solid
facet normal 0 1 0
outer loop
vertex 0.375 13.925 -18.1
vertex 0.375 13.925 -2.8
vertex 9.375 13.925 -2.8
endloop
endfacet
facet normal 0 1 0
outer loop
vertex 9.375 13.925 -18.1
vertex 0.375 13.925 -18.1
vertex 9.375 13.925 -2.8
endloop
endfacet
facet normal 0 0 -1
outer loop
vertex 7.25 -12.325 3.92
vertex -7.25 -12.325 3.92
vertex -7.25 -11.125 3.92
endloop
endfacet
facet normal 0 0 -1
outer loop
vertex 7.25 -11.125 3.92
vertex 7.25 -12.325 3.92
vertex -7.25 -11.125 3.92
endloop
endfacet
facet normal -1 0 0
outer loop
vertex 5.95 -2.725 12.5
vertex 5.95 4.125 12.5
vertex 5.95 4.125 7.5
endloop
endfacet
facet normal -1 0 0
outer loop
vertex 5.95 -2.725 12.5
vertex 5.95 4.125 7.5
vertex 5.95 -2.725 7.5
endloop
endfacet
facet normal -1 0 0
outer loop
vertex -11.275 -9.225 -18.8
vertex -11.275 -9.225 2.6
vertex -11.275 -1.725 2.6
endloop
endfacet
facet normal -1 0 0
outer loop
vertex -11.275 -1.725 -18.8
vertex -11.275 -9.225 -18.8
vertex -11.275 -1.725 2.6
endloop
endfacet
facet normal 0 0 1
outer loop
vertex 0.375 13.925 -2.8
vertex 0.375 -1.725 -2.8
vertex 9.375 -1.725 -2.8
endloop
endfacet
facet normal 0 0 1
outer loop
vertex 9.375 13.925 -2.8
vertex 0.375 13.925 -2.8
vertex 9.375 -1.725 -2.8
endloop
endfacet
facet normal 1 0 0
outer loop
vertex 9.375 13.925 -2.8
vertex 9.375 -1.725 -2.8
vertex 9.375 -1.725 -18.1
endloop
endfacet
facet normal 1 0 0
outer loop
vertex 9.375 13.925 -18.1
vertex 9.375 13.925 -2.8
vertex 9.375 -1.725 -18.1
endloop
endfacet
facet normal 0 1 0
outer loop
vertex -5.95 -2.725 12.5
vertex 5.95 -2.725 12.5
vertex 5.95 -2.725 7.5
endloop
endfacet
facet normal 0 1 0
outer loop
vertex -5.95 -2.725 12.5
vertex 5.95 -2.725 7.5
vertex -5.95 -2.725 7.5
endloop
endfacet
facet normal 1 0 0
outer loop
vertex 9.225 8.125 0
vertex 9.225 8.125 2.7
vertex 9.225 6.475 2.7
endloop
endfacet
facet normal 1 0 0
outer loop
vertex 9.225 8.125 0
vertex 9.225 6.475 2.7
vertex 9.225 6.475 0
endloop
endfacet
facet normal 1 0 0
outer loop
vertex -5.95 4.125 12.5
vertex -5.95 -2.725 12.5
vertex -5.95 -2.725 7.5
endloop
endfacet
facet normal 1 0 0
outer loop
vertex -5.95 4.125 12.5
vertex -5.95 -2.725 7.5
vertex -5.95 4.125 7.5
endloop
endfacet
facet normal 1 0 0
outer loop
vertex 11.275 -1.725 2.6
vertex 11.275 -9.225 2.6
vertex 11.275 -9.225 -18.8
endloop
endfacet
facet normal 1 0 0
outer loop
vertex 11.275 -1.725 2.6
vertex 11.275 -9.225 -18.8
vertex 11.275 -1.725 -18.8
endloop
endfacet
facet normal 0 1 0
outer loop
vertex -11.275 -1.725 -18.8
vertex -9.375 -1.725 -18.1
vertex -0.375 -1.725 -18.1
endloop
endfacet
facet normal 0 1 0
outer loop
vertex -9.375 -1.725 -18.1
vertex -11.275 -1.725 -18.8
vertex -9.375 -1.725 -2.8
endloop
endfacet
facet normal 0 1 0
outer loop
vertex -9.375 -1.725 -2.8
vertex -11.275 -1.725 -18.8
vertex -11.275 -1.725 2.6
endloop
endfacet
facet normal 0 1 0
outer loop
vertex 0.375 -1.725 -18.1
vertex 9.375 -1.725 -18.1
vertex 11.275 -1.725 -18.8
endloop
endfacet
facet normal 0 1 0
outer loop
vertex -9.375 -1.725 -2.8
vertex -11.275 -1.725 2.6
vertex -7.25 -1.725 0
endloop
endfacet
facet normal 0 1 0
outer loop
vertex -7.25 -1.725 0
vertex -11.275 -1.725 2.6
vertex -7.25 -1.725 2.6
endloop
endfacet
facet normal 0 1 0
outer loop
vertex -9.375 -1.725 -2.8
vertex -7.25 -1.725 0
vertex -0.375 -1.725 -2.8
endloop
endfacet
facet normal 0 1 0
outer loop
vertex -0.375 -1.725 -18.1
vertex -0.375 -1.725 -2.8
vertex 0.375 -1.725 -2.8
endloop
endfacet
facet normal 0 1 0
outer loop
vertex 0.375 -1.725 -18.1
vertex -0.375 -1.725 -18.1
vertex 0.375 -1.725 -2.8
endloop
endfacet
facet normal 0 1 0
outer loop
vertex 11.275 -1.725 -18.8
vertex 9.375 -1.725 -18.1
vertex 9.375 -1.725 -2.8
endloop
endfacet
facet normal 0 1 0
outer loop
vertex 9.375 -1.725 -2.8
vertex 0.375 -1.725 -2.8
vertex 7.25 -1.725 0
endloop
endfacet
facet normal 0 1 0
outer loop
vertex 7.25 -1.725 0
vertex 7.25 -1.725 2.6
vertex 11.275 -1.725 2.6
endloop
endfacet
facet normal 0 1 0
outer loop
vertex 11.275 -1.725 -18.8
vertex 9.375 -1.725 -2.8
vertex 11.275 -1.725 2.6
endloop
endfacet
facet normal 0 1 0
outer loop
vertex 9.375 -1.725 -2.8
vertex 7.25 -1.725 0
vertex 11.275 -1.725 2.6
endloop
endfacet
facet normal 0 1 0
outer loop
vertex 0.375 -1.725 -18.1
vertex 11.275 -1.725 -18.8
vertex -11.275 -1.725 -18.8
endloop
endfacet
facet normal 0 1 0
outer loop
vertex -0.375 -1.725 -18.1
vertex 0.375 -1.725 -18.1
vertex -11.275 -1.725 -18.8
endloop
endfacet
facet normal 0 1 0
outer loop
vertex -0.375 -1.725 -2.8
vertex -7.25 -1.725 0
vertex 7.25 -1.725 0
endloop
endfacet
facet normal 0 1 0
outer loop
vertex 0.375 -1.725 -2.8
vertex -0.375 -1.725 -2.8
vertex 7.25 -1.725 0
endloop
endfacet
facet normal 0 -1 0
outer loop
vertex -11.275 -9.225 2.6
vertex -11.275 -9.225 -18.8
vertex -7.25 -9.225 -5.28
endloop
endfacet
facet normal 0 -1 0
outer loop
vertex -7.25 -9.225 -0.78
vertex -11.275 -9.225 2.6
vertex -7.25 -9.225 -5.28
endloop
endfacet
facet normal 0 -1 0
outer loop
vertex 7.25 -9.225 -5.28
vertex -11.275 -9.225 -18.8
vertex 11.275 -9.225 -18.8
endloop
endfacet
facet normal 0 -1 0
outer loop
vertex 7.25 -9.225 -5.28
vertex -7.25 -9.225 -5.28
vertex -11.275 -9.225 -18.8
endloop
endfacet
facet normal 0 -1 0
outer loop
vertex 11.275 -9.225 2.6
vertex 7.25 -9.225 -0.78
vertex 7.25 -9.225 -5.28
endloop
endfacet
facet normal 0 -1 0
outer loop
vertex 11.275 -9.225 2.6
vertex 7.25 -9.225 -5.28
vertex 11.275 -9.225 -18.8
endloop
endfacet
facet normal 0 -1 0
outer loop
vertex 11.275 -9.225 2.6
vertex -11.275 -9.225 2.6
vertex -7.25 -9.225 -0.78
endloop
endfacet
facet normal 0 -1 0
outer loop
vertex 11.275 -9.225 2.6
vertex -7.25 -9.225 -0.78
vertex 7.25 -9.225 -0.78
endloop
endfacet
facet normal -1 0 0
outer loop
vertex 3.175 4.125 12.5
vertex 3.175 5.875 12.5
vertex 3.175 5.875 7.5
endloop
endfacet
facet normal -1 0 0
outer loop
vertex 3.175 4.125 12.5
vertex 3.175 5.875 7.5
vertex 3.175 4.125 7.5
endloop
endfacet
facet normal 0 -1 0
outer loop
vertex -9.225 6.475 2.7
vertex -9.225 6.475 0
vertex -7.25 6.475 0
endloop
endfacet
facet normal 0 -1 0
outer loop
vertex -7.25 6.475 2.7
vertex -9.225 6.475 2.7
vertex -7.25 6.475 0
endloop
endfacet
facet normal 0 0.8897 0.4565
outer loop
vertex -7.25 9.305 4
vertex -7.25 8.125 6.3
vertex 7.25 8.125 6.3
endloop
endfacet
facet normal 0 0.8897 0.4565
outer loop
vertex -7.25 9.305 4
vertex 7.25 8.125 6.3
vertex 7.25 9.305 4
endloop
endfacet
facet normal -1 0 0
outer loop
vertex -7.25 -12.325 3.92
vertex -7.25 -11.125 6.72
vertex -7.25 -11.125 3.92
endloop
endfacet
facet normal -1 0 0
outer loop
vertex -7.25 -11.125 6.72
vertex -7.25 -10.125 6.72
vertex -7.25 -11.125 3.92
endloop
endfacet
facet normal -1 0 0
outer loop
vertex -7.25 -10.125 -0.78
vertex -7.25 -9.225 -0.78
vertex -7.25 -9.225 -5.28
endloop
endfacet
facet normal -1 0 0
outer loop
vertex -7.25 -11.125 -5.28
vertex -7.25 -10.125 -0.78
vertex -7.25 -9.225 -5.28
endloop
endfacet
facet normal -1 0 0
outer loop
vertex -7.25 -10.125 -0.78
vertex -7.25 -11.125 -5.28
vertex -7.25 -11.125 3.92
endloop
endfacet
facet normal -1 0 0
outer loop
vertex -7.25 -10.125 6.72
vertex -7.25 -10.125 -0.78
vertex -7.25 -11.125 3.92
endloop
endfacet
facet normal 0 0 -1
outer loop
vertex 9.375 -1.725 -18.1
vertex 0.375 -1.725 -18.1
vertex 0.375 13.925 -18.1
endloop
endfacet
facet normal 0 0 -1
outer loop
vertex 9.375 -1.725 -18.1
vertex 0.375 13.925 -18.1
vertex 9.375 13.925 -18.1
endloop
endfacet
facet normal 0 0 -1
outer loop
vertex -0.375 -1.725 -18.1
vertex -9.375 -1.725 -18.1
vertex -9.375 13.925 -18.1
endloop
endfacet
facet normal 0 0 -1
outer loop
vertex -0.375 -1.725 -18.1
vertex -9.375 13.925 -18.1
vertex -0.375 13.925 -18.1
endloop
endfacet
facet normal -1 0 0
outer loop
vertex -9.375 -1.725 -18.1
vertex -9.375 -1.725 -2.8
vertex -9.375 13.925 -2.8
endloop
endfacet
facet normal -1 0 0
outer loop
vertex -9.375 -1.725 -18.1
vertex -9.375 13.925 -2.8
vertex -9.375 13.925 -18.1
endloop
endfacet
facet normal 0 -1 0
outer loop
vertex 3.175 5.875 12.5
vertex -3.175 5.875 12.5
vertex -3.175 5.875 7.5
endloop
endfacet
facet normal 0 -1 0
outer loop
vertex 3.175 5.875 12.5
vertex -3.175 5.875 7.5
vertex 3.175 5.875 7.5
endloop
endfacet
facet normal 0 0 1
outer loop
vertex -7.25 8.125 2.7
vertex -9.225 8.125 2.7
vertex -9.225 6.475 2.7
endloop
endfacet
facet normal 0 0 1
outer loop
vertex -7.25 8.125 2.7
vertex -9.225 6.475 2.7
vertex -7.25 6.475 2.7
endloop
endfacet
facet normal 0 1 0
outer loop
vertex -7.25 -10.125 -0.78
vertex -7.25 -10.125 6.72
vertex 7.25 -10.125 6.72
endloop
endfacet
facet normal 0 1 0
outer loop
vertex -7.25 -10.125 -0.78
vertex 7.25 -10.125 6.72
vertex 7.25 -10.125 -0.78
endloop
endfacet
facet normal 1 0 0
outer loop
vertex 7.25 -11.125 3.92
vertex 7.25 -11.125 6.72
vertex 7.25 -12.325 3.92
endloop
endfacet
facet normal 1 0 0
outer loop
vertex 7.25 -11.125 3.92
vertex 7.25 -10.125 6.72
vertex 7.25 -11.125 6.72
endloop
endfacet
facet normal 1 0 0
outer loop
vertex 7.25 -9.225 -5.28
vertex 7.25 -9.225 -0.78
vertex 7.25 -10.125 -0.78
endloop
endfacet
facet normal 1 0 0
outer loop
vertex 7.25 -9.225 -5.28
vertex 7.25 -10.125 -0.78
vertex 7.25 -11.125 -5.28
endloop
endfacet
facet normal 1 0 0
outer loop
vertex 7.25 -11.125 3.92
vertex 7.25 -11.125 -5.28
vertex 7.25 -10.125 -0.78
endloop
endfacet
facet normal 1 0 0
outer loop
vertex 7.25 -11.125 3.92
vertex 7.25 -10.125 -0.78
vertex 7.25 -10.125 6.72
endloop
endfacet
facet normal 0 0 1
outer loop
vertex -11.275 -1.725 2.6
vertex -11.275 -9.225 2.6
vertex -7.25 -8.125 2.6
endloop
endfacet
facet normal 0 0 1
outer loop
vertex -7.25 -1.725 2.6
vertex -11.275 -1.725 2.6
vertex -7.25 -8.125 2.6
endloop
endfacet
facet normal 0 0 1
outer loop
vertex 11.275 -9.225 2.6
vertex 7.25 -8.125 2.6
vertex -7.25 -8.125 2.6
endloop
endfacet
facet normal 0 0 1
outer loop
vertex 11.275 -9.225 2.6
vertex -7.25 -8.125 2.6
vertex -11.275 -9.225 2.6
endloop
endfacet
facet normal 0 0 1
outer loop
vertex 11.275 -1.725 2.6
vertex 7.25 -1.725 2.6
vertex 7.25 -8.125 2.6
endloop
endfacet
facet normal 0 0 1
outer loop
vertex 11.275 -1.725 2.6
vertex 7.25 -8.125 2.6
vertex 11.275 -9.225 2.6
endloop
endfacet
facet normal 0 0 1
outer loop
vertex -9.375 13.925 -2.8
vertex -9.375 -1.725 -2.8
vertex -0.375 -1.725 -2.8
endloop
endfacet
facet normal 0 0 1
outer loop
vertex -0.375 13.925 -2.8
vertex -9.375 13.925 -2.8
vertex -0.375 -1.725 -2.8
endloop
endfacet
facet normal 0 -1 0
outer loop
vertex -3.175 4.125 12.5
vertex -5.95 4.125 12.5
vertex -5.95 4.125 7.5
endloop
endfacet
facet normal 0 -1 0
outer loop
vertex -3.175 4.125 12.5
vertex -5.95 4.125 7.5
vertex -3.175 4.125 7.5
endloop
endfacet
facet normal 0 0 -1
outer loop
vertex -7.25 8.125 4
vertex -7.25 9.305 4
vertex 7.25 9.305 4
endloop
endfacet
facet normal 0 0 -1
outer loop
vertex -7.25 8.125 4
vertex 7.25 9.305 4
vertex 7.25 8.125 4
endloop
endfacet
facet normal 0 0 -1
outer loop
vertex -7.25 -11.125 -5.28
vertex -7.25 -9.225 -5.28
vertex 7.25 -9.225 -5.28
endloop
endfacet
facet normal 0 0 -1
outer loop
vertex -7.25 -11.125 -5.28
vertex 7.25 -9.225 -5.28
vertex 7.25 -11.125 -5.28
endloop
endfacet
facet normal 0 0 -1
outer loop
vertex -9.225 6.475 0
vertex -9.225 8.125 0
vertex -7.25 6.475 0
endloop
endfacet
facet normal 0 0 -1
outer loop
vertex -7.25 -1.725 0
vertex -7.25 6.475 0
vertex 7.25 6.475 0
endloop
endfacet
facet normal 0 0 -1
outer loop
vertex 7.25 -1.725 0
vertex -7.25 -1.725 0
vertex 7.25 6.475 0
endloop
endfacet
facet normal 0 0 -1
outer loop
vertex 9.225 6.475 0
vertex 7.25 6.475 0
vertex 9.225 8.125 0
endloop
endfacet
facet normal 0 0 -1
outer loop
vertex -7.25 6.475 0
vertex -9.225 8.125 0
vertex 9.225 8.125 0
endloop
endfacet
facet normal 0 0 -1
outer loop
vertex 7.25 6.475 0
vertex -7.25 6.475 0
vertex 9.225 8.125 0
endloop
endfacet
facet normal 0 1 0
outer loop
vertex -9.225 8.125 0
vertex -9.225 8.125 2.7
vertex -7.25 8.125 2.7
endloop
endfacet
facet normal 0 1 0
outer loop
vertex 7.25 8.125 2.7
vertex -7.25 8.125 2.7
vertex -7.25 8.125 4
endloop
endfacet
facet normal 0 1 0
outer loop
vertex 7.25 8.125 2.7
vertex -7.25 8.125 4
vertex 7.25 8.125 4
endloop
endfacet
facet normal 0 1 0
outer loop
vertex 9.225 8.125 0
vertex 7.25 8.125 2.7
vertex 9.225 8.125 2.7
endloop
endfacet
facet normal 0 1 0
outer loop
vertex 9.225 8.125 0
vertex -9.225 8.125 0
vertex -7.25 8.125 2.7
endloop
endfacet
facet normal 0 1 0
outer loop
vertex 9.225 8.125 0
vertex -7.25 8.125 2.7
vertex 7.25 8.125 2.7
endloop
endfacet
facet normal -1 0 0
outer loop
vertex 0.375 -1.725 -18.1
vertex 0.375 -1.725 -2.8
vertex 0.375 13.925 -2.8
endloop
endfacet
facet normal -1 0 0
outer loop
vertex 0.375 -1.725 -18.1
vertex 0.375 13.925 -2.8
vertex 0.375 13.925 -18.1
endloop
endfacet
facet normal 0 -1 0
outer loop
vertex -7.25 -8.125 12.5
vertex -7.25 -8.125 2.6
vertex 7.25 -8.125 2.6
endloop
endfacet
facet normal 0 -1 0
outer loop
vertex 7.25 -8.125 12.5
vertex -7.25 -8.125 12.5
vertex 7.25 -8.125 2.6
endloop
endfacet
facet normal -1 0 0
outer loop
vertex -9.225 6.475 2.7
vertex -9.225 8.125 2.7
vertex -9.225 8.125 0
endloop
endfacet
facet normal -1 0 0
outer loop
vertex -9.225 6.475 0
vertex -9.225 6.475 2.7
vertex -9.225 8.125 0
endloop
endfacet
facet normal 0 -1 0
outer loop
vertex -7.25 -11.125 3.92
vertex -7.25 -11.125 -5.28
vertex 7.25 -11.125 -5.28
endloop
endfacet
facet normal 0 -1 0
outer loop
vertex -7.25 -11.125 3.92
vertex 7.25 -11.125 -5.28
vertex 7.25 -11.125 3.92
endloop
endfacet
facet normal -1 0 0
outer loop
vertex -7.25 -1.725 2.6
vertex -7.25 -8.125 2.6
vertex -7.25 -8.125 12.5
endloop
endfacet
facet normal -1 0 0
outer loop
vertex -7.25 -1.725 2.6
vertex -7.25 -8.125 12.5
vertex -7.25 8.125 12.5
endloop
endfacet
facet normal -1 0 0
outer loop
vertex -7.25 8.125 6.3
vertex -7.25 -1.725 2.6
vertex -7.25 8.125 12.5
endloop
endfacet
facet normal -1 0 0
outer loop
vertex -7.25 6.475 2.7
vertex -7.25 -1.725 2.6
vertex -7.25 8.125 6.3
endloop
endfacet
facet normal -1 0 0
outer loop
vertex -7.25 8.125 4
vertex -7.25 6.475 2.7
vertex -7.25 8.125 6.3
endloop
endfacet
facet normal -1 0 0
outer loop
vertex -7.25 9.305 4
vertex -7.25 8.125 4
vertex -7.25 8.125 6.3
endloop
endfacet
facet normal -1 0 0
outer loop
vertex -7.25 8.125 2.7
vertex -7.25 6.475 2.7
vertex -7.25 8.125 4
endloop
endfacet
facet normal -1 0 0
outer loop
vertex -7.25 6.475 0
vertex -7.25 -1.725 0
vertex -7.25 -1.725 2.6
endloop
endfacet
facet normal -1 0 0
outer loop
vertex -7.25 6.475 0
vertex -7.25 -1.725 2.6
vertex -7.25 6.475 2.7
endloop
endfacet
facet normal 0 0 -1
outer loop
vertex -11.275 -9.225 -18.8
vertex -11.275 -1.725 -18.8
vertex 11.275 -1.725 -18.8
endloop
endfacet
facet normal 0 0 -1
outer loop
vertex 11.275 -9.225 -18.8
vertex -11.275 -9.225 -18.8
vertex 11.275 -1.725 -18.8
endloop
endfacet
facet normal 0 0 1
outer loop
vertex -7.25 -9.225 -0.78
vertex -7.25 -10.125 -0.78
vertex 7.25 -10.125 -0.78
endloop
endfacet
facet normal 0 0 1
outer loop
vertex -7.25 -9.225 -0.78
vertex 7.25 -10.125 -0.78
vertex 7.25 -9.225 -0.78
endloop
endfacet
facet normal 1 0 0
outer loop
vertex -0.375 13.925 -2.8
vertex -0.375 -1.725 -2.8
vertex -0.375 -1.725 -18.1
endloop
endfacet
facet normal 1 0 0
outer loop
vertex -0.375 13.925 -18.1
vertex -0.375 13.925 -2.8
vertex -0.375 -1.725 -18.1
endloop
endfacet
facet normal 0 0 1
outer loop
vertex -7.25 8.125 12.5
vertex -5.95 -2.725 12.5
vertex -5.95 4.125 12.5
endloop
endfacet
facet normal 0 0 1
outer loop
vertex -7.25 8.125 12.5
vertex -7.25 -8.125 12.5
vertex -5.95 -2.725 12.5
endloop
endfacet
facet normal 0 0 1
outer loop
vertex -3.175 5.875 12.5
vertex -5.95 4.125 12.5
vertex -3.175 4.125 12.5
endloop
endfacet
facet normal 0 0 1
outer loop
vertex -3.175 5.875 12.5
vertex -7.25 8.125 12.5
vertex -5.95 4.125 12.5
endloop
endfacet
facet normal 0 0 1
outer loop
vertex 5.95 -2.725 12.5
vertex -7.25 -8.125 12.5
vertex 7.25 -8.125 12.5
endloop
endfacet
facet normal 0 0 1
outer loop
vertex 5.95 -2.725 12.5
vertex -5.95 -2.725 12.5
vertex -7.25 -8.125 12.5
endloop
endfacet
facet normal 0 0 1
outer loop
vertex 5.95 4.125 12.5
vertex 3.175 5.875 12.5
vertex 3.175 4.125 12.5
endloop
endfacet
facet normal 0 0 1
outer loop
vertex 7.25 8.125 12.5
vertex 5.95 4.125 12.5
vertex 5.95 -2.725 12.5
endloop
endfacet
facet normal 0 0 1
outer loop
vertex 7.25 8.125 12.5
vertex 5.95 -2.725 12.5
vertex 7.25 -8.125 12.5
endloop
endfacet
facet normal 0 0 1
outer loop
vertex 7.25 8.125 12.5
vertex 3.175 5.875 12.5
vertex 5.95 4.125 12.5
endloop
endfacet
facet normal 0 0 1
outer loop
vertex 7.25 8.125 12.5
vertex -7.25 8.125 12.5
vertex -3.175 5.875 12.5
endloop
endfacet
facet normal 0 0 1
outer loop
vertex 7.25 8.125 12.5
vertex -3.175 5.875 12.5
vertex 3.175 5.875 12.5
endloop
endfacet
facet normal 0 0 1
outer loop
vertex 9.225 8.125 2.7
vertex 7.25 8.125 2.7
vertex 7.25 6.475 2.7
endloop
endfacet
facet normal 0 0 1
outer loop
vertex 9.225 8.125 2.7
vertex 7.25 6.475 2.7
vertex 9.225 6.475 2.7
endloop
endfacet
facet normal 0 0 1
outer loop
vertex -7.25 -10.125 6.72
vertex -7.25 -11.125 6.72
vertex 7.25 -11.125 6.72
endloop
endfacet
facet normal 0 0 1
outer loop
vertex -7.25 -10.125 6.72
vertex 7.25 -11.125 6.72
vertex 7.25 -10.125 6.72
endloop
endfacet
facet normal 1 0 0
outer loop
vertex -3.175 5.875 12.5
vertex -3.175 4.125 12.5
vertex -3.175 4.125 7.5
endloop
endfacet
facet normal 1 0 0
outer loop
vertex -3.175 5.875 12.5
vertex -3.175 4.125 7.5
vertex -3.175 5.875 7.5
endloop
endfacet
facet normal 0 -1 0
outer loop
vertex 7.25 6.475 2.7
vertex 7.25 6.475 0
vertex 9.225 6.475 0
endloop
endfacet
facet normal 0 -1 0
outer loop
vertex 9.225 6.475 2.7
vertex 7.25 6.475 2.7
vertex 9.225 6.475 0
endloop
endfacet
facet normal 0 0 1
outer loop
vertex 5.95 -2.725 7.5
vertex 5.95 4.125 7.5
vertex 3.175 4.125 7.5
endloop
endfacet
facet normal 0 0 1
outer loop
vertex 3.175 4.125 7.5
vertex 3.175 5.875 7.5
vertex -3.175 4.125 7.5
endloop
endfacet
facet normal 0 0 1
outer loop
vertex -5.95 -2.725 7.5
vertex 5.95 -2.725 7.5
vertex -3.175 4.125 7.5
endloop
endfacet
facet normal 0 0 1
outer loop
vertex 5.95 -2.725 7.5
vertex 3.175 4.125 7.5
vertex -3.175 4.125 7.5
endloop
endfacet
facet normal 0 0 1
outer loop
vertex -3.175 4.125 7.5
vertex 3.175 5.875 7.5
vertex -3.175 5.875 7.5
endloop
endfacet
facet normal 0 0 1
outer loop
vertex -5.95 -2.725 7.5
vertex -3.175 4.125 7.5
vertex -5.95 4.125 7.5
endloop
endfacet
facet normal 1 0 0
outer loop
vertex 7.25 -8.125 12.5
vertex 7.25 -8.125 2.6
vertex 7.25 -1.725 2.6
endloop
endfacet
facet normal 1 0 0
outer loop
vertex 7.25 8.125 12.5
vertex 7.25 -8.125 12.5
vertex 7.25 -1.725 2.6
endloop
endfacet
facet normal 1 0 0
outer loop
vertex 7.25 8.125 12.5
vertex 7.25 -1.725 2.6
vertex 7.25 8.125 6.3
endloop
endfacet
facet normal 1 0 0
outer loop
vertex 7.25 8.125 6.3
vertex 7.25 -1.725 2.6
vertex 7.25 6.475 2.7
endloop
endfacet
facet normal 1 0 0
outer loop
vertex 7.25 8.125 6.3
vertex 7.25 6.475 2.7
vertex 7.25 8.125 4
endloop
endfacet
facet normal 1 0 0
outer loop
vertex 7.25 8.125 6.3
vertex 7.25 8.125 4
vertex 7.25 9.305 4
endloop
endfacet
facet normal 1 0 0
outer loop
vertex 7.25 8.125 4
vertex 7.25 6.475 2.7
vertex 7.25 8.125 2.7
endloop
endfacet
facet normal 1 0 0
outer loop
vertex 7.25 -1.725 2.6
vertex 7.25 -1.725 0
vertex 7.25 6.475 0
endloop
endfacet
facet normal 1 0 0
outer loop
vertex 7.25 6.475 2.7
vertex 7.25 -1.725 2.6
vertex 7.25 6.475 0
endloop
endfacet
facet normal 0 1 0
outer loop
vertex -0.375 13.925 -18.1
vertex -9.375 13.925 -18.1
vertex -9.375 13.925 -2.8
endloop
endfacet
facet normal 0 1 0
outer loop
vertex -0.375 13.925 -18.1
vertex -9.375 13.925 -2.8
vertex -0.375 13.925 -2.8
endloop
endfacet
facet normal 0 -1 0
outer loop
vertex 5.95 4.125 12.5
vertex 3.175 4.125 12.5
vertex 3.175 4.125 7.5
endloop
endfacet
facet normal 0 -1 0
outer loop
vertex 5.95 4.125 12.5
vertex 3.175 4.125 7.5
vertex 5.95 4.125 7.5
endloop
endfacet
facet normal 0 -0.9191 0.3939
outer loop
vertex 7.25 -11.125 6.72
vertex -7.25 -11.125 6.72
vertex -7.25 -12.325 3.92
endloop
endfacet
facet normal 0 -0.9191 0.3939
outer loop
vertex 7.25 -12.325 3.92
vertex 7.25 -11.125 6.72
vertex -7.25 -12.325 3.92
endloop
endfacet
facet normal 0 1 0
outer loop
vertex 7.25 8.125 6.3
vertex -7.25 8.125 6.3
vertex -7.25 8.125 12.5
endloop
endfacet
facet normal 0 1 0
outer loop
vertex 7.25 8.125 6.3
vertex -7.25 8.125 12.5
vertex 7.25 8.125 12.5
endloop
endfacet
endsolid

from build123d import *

# Parameters (mm, degrees)
ESBO_O1_W                = 14.5
ESBO_O1_H                = 16.25
RESSALTO_EXTRUS_O1_DEPTH = 12.5
RESSALTO_EXTRUS_O2_DEPTH = 14.5
ESBO_O3_W                = 18.45
ESBO_O3_H                = 2.7
RESSALTO_EXTRUS_O3_DEPTH = 1.65
CORTE_EXTRUS_O1_DEPTH    = 5
RESSALTO_EXTRUS_O4_START = -9.9
ESBO_O5_W                = 22.55
ESBO_O5_H                = 7.5
RESSALTO_EXTRUS_O4_DEPTH = 21.4
ESBO_O6_W                = 9
ESBO_O6_H                = 15.3
RESSALTO_EXTRUS_O5_DEPTH = 15.65
RESSALTO_EXTRUS_O6_DEPTH = 14.5
RESSALTO_EXTRUS_O7_DEPTH = 14.5


with BuildPart() as part:
    # Esboço1 → Ressalto-extrusão1 (new body)
    with BuildSketch(Plane.XY):
        Rectangle(ESBO_O1_W, ESBO_O1_H)
    extrude(amount=RESSALTO_EXTRUS_O1_DEPTH)

    # Esboço2 → Ressalto-extrusão2 (add)
    with BuildSketch(Plane.ZY.offset(7.25)):
        Polygon((6.3, 8.125), (4, 9.305), (4, 8.125), align=None)
    extrude(amount=-RESSALTO_EXTRUS_O2_DEPTH)

    # Esboço3 → Ressalto-extrusão3 (add)
    with BuildSketch(Plane(origin=(0, 8.125, 0), x_dir=(1, 0, 0), z_dir=(0, 1, 0))):
        with Locations((0, -1.35)):
            Rectangle(ESBO_O3_W, ESBO_O3_H)
    extrude(amount=-RESSALTO_EXTRUS_O3_DEPTH)

    # Esboço4 → Corte-extrusão1 (cut)
    with BuildSketch(Plane.XY.offset(12.5)):
        Polygon((-5.95, 4.125), (-3.175, 4.125), (-3.175, 5.875), (3.175, 5.875), (3.175, 4.125), (5.95, 4.125), (5.95, -2.725), (-5.95, -2.725), align=None)
    extrude(amount=-CORTE_EXTRUS_O1_DEPTH, mode=Mode.SUBTRACT)

    # Esboço5 → Ressalto-extrusão4 (add)
    with BuildSketch(Plane.XY.offset(12.5).offset(RESSALTO_EXTRUS_O4_START)):
        with Locations((0, -5.475)):
            Rectangle(ESBO_O5_W, ESBO_O5_H)
    extrude(amount=-RESSALTO_EXTRUS_O4_DEPTH)

    # Esboço6 → Ressalto-extrusão5 (add)
    with BuildSketch(Plane(origin=(0, -1.725, 0), x_dir=(1, 0, 0), z_dir=(0, 1, 0))):
        with Locations((-4.875, 10.45)):
            Rectangle(ESBO_O6_W, ESBO_O6_H)
        with Locations((4.875, 10.45)):
            Rectangle(ESBO_O6_W, ESBO_O6_H)
    extrude(amount=RESSALTO_EXTRUS_O5_DEPTH)

    # Esboço7 → Ressalto-extrusão6 (add)
    with BuildSketch(Plane.ZY.offset(7.25)):
        Polygon((-5.28, -9.225), (-5.28, -11.125), (6.72, -11.125), (6.72, -10.125), (-0.78, -10.125), (-0.78, -9.225), align=None)
    extrude(amount=-RESSALTO_EXTRUS_O6_DEPTH)

    # Esboço8 → Ressalto-extrusão7 (add)
    with BuildSketch(Plane.ZY.offset(7.25)):
        Polygon((6.72, -11.125), (3.92, -12.325), (3.92, -11.125), align=None)
    extrude(amount=-RESSALTO_EXTRUS_O7_DEPTH)


solid = part.part
